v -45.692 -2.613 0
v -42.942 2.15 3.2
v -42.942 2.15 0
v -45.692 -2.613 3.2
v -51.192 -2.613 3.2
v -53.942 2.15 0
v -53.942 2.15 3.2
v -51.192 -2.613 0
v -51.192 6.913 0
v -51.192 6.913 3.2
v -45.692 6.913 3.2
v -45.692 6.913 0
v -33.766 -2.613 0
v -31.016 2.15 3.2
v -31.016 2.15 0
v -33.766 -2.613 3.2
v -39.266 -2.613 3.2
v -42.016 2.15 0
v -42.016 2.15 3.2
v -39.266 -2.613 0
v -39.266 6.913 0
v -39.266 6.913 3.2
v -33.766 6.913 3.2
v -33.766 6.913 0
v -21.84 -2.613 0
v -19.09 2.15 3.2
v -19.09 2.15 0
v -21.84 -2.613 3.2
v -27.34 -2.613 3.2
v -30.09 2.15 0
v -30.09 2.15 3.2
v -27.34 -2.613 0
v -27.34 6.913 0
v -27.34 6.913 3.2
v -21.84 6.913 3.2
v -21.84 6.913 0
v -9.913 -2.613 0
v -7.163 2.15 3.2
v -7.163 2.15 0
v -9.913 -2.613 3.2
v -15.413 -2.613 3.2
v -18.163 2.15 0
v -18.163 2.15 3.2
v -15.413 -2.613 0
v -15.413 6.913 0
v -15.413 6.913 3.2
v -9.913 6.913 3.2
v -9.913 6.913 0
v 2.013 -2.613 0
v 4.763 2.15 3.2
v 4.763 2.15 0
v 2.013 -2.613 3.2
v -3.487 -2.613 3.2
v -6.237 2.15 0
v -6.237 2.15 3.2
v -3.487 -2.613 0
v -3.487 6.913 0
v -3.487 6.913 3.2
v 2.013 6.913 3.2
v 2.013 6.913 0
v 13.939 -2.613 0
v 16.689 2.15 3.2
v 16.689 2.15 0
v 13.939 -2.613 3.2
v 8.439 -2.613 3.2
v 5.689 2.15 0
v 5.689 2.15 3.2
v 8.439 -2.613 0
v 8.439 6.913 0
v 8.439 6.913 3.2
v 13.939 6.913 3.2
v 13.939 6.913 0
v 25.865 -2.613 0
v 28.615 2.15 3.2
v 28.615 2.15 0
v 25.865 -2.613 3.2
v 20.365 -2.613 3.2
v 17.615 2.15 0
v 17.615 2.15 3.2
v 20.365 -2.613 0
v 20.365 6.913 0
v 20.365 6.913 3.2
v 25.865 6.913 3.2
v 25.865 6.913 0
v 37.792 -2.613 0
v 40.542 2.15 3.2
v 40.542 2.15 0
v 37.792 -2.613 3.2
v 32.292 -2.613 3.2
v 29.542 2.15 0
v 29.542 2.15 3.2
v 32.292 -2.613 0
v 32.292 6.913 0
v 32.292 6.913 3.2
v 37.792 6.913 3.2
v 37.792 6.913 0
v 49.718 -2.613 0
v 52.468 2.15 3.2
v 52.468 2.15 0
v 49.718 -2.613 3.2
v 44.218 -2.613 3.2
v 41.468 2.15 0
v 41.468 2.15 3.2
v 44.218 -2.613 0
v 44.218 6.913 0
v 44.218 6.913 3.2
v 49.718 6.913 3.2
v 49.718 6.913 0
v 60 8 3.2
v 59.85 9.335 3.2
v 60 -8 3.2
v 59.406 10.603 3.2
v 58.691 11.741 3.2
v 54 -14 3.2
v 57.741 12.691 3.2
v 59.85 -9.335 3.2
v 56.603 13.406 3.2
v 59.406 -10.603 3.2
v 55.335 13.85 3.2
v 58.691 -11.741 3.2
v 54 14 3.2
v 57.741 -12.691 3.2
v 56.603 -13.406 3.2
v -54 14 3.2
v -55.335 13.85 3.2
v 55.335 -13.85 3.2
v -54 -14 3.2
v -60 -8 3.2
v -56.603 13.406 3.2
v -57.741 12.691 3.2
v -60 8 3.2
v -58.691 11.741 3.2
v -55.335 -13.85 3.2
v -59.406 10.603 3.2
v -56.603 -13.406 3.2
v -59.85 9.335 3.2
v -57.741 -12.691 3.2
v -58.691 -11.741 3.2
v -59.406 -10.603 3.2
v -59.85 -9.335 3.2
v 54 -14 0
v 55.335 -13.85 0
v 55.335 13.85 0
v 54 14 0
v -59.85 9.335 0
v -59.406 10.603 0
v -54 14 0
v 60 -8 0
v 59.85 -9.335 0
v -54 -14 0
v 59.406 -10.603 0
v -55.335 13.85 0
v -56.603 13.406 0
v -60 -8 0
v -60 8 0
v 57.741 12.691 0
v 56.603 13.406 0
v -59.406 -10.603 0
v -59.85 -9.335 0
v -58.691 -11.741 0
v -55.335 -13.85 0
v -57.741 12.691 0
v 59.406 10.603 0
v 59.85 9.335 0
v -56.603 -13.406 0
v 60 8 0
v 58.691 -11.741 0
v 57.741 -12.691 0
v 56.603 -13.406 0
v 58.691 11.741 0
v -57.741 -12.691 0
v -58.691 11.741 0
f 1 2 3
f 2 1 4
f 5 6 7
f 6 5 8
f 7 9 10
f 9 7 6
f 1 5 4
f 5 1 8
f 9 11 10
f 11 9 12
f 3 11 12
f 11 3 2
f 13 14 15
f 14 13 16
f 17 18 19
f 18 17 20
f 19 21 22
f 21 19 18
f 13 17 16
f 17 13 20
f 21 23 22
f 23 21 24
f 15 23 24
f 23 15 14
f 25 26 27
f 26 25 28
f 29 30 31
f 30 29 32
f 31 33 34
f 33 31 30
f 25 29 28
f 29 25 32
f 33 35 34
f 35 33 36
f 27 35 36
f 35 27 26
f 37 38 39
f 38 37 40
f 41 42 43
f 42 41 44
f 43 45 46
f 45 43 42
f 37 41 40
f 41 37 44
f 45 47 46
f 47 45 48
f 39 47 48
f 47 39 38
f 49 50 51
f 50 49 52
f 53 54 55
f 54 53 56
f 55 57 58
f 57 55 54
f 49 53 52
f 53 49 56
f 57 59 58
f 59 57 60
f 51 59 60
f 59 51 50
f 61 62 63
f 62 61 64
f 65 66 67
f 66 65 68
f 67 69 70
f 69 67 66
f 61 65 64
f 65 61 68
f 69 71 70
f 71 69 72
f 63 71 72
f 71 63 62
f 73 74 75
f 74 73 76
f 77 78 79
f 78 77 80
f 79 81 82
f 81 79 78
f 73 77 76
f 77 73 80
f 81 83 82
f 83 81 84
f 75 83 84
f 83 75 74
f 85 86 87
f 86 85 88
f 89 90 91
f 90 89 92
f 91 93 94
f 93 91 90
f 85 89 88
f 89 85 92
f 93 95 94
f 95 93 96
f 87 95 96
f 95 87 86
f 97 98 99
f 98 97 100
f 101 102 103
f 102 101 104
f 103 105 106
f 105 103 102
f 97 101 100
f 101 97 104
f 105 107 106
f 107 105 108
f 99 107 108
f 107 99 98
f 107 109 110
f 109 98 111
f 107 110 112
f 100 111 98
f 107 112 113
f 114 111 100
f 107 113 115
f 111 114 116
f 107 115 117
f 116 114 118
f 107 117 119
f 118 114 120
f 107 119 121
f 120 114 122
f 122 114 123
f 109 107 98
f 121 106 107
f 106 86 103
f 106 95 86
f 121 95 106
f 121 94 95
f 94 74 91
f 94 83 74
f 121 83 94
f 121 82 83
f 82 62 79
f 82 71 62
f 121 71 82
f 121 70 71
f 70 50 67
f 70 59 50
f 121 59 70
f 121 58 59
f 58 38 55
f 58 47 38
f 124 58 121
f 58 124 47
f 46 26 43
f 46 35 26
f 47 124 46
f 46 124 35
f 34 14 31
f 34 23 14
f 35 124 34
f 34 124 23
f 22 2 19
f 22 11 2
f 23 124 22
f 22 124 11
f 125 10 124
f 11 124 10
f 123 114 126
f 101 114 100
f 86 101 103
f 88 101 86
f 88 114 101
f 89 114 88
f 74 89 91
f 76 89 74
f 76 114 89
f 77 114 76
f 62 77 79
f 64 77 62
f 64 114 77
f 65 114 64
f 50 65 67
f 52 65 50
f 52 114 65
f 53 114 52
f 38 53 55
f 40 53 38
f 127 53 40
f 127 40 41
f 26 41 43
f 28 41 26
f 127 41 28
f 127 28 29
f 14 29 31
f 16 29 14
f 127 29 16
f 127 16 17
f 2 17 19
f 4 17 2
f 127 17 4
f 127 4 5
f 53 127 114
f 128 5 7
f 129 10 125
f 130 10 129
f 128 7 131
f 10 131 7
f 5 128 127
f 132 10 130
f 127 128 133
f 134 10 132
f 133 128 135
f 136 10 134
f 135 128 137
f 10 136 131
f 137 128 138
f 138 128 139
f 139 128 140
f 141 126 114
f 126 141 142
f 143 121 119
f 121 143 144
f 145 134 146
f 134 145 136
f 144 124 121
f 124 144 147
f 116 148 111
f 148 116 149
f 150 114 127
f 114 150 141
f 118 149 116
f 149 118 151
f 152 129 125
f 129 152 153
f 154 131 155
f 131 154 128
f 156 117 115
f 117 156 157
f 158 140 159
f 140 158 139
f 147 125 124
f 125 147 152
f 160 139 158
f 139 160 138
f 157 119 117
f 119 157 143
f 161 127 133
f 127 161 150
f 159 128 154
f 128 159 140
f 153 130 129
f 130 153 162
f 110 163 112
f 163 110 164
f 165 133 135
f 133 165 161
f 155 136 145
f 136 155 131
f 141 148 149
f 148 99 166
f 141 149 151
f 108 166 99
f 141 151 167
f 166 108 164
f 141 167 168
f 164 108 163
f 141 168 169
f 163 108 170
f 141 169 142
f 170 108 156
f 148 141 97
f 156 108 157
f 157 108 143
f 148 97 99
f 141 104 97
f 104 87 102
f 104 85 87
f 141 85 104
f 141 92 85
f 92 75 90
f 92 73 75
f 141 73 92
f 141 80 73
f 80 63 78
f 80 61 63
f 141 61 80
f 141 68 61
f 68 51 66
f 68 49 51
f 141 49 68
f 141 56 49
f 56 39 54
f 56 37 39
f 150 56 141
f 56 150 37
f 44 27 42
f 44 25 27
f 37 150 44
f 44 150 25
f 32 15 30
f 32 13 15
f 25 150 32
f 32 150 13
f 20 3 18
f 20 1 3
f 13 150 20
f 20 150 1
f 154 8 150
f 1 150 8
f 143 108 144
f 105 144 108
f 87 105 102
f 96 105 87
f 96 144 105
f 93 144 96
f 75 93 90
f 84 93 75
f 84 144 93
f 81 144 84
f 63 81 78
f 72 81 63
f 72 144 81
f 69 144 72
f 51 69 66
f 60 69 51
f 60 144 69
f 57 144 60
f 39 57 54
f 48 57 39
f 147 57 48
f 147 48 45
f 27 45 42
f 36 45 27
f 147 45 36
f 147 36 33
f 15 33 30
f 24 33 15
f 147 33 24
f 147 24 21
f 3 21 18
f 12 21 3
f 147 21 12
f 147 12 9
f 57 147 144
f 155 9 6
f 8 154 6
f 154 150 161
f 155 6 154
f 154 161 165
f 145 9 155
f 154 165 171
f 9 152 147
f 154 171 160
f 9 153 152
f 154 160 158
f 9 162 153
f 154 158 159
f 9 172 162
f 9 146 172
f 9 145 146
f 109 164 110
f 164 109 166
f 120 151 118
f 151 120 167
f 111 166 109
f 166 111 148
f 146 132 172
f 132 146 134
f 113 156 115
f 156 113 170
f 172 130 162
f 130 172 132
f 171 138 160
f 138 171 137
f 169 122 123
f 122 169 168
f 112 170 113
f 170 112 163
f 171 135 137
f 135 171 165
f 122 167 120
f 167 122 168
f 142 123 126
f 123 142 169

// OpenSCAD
// =============================================================================
// generative_loadpath.scad — parametric load-path / organic structure demos
// Pure OpenSCAD. Heuristic generative (Tier 0), not FEA/TO.
// Units: mm. Print feet-down.
// =============================================================================

/* [Domain] */
span_x = 120;
depth_y = 28;
height_z = 36;
wall = 3.2;
chord_t = 3.2;

/* [Load-path truss] */
n_bays = 4;
member_d = 3.2;
joint_r = 4.0;
soft_r = 6;

/* [Deck voids] */
hex_r = 5.5;
hex_bar = 2.4;
hex_margin = 8;

/* [Quality] */
$fn = 28;
eps = 0.05;

// --- helpers -----------------------------------------------------------------
module soft_rect(x, y, r) {
  rr = min(r, min(x, y) / 2 - 0.01);
  offset(r = rr)
    square([x - 2 * rr, y - 2 * rr], center = true);
}

module node(p) {
  translate(p) sphere(r = joint_r);
}

module member(a, b, d = member_d) {
  hull() {
    translate(a) sphere(r = d / 2);
    translate(b) sphere(r = d / 2);
  }
}

// Simple bridge truss: top + bottom chords, verticals, 45-ish diagonals
module loadpath_truss() {
  bay = span_x / n_bays;
  z0 = joint_r;
  z1 = height_z - joint_r;
  y = 0;

  // nodes
  for (i = [0 : n_bays]) {
    x = -span_x / 2 + i * bay;
    node([x, y, z0]);
    node([x, y, z1]);
  }

  // chords + verticals + diagonals
  for (i = [0 : n_bays - 1]) {
    x0 = -span_x / 2 + i * bay;
    x1 = x0 + bay;
    // bottom / top chords
    member([x0, y, z0], [x1, y, z0]);
    member([x0, y, z1], [x1, y, z1]);
    // vertical
    member([x1, y, z0], [x1, y, z1]);
    // diagonal (zigzag) — keep angle printable-ish when printed on side;
    // for feet-down bridge print, prefer this as a **side-lying** part or
    // reorient diagonals as buttresses in real projects.
    if (i % 2 == 0)
      member([x0, y, z0], [x1, y, z1]);
    else
      member([x0, y, z1], [x1, y, z0]);
  }
  // left vertical
  member([-span_x / 2, y, z0], [-span_x / 2, y, z1]);
}

// Soft plate with hex voids (organic deck language)
module hex_deck(x, y, t) {
  difference() {
    linear_extrude(height = t)
      soft_rect(x, y, soft_r);
    // hex grid cut
    px = hex_r * sqrt(3) + hex_bar;
    py = hex_r * 1.5 + hex_bar * 0.75;
    for (ix = [-x : px : x], iy = [-y : py : y]) {
      row = round(iy / py);
      xoff = (row % 2) * (px / 2);
      xx = ix + xoff;
      yy = iy;
      if (abs(xx) < x / 2 - hex_margin && abs(yy) < y / 2 - hex_margin)
        translate([xx, yy, -eps])
          linear_extrude(height = t + 2 * eps)
            circle(r = hex_r, $fn = 6);
    }
  }
}

// Branching support: trunk + two 45° arms into deck nodes (print-in-place vibe)
module branch_support(h, spread = 40, d0 = 6, d1 = 2.8) {
  // trunk
  cylinder(d1 = d0, d2 = d1, h = h * 0.55);
  // arms
  for (s = [-1, 1])
    hull() {
      translate([0, 0, h * 0.5]) sphere(d = d1);
      translate([s * spread / 2, 0, h]) sphere(d = d1);
    }
}

// Demo selector
variant = "deck"; // "deck" | "truss" | "branch"

if (variant == "truss") {
  // WARNING: pure mid-air truss may need supports or side print — demo only
  loadpath_truss();
} else if (variant == "branch") {
  branch_support(height_z, spread = span_x * 0.35);
  translate([0, 0, height_z])
    hex_deck(span_x * 0.5, depth_y, chord_t);
} else {
  // default: soft hex deck plate
  hex_deck(span_x, depth_y, chord_t);
}

echo(str("variant=", variant, " span=", span_x, " height=", height_z));
